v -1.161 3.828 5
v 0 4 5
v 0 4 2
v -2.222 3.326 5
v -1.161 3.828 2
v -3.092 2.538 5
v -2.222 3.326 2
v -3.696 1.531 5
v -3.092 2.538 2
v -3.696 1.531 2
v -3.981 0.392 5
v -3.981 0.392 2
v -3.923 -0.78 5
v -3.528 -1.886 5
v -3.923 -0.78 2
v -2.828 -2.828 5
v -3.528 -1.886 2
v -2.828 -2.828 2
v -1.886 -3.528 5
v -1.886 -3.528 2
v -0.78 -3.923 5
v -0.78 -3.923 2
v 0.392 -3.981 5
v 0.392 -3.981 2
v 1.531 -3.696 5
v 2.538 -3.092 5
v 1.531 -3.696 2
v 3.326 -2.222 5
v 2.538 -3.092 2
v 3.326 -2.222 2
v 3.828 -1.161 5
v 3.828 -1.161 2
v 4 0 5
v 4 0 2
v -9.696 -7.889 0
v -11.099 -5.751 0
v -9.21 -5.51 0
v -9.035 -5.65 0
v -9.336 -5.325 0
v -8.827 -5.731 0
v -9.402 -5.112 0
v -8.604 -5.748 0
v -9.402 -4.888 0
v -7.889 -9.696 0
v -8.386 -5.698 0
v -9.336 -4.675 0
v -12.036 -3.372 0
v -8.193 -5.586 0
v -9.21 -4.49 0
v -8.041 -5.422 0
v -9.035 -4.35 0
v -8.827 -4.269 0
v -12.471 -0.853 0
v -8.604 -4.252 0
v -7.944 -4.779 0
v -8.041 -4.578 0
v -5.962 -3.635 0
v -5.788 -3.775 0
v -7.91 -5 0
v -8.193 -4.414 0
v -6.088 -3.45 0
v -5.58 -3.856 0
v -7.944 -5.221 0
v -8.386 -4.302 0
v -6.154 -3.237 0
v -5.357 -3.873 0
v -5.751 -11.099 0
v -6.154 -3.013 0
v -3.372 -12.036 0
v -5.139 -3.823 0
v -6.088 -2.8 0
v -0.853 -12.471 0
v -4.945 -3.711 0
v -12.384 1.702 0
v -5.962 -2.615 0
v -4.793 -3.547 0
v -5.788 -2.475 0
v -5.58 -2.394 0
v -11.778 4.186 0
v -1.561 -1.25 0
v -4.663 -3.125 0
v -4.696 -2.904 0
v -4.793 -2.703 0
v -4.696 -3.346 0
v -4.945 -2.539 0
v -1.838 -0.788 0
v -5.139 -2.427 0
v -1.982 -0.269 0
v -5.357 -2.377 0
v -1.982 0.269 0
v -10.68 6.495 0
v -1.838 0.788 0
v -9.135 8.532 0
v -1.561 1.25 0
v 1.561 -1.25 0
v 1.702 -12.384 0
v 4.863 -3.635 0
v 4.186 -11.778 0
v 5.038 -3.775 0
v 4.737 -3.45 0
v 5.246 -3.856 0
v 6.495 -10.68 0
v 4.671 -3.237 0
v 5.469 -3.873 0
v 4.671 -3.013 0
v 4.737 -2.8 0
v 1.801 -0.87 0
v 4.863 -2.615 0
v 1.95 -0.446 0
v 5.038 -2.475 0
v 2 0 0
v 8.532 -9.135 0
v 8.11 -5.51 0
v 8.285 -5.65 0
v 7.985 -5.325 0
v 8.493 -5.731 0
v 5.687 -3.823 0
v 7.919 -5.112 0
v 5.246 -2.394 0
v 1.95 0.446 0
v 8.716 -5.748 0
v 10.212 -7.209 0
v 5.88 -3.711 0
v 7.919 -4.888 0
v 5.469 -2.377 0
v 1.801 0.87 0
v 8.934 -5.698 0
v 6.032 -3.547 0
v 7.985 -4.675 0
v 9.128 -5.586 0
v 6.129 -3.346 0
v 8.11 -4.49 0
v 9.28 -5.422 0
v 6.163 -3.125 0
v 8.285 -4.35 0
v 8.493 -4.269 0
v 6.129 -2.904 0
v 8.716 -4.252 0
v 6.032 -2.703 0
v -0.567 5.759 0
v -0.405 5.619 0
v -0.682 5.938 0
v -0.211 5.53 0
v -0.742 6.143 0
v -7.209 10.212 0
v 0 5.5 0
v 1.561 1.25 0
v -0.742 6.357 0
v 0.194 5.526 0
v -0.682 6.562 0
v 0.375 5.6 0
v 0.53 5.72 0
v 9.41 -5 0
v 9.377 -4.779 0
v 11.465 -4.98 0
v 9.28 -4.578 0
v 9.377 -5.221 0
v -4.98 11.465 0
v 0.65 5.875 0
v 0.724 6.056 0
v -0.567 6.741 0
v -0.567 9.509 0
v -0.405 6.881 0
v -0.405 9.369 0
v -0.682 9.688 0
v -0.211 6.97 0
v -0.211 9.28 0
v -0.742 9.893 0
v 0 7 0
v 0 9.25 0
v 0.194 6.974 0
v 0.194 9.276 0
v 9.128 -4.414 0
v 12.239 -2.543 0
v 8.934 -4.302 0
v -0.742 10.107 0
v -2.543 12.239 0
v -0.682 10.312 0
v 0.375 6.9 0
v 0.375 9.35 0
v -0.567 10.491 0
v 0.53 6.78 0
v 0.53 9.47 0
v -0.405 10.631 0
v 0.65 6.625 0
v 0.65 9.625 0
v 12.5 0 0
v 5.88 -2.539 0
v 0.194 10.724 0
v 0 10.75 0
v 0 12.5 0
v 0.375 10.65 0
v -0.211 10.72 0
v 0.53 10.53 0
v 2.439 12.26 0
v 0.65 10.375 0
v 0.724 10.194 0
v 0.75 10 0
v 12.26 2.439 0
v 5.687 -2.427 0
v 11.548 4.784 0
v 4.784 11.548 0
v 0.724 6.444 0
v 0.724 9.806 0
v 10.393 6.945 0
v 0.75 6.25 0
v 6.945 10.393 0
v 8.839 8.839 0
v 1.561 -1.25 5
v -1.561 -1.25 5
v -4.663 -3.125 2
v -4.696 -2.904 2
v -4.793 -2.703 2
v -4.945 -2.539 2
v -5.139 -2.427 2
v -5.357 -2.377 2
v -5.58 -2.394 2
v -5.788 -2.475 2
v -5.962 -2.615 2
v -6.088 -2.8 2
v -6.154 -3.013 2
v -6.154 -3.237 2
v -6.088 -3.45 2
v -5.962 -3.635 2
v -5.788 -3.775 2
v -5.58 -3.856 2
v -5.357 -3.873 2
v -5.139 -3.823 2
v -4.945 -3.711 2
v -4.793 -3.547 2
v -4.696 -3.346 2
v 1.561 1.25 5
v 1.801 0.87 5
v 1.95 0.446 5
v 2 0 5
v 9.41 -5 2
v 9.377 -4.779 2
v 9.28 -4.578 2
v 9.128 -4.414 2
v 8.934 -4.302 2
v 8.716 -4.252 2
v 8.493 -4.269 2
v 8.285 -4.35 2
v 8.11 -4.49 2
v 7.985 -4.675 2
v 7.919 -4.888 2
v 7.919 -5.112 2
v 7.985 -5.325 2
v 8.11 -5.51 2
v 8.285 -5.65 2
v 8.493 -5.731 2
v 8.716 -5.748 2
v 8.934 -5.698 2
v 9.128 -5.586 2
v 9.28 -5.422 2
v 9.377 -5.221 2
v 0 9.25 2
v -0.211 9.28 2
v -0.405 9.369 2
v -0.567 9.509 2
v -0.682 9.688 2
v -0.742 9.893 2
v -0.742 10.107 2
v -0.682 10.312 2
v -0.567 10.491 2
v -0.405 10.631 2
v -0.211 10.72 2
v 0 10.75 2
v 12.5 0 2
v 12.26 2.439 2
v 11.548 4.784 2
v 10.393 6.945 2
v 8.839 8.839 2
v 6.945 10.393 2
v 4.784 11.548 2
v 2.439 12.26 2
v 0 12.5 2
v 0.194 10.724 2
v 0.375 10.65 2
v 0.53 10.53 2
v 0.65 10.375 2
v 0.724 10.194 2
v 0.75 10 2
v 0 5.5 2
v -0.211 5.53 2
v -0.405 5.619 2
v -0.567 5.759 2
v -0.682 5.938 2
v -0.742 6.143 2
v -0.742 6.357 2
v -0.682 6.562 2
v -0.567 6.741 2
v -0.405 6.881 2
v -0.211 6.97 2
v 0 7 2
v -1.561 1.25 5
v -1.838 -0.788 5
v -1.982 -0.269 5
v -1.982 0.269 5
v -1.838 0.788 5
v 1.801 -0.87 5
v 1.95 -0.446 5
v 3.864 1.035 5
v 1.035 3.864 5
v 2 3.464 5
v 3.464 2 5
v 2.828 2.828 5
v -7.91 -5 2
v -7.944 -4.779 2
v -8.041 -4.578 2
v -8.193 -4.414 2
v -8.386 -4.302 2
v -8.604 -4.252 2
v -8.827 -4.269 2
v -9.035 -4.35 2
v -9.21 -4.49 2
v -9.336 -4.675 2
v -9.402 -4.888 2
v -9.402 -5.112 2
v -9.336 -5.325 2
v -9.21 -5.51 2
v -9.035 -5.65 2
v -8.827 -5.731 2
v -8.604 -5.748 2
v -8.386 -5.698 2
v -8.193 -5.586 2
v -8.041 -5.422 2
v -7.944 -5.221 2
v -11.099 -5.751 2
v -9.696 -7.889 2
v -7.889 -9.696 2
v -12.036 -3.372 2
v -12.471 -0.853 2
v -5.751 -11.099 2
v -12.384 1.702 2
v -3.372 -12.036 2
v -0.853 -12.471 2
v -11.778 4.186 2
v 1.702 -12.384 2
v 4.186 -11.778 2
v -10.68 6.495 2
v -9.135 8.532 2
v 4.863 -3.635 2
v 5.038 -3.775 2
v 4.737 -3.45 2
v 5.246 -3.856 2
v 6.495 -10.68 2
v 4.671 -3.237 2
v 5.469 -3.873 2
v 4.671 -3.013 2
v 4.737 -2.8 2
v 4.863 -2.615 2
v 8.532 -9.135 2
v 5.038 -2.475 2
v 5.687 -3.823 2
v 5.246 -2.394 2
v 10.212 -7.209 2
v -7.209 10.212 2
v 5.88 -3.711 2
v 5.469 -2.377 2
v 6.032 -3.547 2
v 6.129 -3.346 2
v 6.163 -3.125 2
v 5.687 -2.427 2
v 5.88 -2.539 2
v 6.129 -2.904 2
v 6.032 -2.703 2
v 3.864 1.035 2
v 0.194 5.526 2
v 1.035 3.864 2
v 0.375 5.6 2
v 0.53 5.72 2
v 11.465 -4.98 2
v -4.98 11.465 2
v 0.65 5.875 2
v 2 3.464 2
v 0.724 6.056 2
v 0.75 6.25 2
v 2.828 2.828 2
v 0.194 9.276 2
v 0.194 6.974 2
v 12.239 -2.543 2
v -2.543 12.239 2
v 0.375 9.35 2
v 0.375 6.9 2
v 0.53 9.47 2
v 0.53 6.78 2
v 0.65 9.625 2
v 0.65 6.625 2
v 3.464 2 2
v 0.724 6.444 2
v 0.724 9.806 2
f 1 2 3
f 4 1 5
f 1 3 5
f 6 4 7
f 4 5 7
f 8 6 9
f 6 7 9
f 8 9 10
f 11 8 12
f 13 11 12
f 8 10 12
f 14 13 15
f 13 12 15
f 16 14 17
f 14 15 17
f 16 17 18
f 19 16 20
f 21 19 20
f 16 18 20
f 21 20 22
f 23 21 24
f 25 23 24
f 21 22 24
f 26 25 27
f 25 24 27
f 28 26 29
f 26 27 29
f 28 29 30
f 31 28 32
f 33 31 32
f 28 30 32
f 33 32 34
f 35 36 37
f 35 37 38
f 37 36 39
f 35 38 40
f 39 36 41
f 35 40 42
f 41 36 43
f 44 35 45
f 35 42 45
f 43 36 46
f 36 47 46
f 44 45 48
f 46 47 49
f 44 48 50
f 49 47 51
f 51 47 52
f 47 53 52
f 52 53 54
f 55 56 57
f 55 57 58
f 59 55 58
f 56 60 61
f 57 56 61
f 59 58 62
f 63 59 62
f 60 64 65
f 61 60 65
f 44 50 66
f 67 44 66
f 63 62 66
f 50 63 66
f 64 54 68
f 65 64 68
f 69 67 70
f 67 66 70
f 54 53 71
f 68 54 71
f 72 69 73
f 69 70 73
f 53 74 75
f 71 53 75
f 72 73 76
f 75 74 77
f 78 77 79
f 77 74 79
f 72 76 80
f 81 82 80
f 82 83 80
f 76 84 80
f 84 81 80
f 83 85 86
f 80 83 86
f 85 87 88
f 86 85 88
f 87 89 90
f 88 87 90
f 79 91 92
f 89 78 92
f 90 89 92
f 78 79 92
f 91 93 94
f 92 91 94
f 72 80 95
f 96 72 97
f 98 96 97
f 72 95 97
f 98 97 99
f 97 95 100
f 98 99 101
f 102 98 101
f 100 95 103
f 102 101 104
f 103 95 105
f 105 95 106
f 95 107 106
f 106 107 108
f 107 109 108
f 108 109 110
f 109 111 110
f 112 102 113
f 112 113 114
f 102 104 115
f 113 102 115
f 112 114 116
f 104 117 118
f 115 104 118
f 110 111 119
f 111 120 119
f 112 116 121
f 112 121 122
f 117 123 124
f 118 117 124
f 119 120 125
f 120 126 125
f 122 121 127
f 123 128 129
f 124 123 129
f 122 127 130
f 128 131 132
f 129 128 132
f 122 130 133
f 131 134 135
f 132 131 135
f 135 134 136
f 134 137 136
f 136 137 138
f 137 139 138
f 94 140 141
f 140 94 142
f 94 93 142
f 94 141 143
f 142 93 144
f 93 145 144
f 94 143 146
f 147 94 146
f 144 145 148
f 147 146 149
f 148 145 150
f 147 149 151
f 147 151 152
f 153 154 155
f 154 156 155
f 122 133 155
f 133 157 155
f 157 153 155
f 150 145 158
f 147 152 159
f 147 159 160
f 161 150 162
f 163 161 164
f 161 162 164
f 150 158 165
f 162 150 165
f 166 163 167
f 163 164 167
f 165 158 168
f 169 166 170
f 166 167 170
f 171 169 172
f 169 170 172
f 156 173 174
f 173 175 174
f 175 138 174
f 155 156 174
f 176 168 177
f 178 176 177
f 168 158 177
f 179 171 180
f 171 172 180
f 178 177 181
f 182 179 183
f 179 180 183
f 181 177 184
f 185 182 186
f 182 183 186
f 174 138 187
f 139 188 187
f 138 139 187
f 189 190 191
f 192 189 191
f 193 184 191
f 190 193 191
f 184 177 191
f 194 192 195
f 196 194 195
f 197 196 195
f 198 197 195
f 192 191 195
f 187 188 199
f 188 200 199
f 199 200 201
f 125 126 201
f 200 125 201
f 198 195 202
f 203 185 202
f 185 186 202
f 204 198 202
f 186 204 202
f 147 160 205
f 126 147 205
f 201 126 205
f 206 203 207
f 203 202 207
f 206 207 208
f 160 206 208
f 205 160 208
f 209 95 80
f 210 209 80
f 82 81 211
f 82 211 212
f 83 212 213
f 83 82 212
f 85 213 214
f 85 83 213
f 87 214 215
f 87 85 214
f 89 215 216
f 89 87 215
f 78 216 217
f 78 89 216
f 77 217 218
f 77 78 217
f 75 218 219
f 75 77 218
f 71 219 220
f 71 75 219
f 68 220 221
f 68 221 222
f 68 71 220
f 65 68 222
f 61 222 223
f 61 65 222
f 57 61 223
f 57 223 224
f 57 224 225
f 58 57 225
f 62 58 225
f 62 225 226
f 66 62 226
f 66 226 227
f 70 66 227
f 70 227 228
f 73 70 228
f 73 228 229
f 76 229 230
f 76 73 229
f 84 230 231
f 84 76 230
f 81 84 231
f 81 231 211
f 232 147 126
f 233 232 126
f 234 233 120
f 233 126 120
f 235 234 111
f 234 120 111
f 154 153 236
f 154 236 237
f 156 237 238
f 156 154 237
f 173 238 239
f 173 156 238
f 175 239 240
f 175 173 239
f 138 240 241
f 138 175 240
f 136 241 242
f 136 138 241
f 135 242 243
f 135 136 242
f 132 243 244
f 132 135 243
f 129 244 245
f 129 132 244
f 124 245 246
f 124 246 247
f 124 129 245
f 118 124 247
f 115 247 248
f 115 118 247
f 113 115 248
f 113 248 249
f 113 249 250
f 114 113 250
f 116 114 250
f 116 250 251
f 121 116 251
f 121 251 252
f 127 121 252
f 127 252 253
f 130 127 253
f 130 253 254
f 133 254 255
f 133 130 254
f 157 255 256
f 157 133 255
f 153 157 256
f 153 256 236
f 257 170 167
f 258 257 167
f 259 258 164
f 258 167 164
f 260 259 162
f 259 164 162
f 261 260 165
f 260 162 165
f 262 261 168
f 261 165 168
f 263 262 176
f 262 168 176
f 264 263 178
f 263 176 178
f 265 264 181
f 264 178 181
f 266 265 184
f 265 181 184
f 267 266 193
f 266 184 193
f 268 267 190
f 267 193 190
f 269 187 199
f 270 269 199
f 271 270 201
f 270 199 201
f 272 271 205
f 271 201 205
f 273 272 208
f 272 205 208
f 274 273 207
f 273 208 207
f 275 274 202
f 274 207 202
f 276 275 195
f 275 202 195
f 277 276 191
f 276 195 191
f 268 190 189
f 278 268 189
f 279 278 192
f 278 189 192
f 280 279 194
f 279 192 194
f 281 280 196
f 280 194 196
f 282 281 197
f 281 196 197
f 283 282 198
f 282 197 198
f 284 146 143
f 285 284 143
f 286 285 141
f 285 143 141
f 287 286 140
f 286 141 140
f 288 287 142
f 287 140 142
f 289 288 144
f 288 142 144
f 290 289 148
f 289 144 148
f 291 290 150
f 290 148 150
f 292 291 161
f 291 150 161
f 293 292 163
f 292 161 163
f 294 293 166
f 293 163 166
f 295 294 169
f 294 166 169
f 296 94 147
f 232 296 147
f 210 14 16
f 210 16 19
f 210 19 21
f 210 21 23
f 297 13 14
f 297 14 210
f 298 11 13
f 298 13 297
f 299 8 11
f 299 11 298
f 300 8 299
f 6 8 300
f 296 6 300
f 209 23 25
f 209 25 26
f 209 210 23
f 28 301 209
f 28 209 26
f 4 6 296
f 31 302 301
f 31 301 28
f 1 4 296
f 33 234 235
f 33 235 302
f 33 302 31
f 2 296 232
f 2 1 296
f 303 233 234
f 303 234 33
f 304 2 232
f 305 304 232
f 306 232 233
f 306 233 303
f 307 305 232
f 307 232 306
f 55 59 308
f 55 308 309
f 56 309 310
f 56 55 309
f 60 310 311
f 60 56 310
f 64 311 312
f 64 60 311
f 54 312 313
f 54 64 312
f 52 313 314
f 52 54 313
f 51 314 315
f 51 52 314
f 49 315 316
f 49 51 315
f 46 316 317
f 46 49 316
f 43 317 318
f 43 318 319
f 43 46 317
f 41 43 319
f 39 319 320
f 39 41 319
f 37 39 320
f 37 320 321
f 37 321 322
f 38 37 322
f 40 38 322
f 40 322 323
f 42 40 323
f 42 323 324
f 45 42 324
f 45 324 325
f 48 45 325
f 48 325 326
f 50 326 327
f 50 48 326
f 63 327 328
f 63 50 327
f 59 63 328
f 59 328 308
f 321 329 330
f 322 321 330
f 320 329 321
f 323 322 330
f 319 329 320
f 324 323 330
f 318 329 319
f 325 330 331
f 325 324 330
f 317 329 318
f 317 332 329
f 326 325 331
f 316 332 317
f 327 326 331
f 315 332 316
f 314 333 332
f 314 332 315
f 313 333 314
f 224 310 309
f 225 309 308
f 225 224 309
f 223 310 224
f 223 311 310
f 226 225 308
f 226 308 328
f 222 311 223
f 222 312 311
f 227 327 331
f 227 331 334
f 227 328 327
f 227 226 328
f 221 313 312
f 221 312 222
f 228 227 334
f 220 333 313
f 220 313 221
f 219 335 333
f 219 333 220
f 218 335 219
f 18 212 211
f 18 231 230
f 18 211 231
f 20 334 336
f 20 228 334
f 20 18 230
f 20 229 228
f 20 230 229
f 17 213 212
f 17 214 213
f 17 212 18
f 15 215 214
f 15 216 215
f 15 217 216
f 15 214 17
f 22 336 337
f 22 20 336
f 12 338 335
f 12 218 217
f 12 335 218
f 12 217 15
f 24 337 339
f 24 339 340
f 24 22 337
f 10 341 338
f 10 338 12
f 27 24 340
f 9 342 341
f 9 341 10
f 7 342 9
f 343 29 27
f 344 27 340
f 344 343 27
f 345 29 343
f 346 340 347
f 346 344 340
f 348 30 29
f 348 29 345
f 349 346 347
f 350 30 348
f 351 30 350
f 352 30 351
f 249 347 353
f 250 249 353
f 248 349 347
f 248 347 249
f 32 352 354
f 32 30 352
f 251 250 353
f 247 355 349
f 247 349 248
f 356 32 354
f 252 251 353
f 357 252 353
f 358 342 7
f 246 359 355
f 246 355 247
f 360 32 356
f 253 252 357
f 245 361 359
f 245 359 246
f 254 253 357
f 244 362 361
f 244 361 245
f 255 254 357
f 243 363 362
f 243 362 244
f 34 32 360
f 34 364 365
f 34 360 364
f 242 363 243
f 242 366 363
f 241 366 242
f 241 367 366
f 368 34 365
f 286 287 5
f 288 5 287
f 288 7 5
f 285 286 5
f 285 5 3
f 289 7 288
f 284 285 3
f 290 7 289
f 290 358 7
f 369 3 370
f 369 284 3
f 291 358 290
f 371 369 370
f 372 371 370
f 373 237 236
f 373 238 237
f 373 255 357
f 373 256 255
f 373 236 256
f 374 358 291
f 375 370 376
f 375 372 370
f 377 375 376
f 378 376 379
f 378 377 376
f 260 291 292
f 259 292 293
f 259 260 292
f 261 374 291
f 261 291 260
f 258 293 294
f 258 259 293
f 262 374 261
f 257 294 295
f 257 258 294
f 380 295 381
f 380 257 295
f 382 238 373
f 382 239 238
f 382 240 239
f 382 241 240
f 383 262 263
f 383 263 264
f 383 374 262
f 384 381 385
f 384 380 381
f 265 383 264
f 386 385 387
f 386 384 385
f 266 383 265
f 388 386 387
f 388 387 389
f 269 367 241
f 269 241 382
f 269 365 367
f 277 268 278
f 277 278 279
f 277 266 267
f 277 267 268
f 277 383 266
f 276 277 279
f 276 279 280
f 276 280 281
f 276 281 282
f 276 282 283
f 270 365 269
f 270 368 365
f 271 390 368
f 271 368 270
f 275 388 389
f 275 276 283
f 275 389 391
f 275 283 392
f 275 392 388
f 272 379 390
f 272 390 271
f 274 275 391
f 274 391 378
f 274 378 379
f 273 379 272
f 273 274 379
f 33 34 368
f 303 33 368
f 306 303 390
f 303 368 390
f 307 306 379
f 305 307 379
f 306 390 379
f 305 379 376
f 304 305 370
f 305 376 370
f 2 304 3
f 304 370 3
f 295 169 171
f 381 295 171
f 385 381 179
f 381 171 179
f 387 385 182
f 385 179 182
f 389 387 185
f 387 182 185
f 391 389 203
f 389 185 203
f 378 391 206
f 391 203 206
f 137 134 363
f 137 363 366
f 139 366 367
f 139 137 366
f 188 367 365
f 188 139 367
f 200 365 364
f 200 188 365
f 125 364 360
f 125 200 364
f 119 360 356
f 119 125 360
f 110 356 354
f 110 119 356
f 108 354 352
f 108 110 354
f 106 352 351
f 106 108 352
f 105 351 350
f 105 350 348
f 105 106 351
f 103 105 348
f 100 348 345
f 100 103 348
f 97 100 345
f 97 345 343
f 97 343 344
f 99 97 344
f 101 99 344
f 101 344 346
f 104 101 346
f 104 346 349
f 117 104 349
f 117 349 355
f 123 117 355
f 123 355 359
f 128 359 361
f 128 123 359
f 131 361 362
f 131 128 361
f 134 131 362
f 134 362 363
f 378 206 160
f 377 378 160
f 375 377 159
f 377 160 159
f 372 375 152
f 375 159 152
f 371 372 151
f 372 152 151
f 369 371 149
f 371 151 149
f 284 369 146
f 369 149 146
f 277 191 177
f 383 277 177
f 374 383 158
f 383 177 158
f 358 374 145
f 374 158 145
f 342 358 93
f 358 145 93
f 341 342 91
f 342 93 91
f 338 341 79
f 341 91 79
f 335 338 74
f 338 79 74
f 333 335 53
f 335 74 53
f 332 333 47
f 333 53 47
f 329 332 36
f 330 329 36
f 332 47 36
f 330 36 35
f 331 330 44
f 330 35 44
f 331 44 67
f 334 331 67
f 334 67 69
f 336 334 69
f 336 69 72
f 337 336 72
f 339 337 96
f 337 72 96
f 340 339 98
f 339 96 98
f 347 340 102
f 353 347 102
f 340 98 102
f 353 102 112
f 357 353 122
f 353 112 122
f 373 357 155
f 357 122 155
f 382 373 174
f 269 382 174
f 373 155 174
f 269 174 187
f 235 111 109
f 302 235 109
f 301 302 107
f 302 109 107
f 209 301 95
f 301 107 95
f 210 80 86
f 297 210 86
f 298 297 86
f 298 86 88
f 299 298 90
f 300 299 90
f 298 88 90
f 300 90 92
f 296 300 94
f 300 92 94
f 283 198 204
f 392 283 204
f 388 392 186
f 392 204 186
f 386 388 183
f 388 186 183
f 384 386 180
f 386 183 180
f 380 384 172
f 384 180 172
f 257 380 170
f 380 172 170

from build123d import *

# Parameters (mm, degrees)
F0_R     = 0.75
F1_DEPTH = 2
F2_DEPTH = 5


with BuildPart() as f1:
    # F0 (on Top) → F1 (new body)
    with BuildSketch(Plane.XY):
        with BuildLine():
            ThreePointArc((12.5, 0), (8.8388347648, 8.8388347648), (0, 12.5))
            ThreePointArc((0, 12.5), (-8.8388347648, -8.8388347648), (12.5, 0))
        make_face()
        with Locations((-8.6602540378, -5)):
            Circle(F0_R, mode=Mode.SUBTRACT)
        with Locations((-5.4126587737, -3.125)):
            Circle(F0_R, mode=Mode.SUBTRACT)
        with Locations((5.4126587737, -3.125)):
            Circle(F0_R, mode=Mode.SUBTRACT)
        with Locations((8.6602540378, -5)):
            Circle(F0_R, mode=Mode.SUBTRACT)
        with BuildLine():
            ThreePointArc((4, 0), (-2.8284271247, -2.8284271247), (0, 4))
            ThreePointArc((0, 4), (2.8284271247, 2.8284271247), (4, 0))
        make_face(mode=Mode.SUBTRACT)
        with BuildLine():
            ThreePointArc((0.75, 6.25), (0.5303300859, 5.7196699141), (0, 5.5))
            ThreePointArc((0, 5.5), (-0.75, 6.25), (0, 7))
            ThreePointArc((0, 7), (0.5303300859, 6.7803300859), (0.75, 6.25))
        make_face(mode=Mode.SUBTRACT)
        with BuildLine():
            ThreePointArc((0.75, 10), (0.5303300859, 9.4696699141), (0, 9.25))
            ThreePointArc((0, 9.25), (-0.75, 10), (0, 10.75))
            ThreePointArc((0, 10.75), (0.5303300859, 10.5303300859), (0.75, 10))
        make_face(mode=Mode.SUBTRACT)
    extrude(amount=F1_DEPTH)

    # F0 (on Top) → F2 (join)
    with BuildSketch(Plane.XY):
        with BuildLine():
            ThreePointArc((4, 0), (2.8284271247, 2.8284271247), (0, 4))
            ThreePointArc((0, 4), (-2.8284271247, -2.8284271247), (4, 0))
        make_face()
        with BuildLine():
            ThreePointArc((1.5612494996, 1.25), (1.8871273141, 0.6623824427), (2, 0))
            ThreePointArc((2, 0), (1.8871273141, -0.6623824427), (1.5612494996, -1.25))
            ThreePointArc((1.5612494996, -1.25), (0, -2), (-1.5612494996, -1.25))
            ThreePointArc((-1.5612494996, -1.25), (-2, 0), (-1.5612494996, 1.25))
            ThreePointArc((-1.5612494996, 1.25), (-0.8660254038, 1.8027756377), (0, 2))
            ThreePointArc((0, 2), (0.8660254038, 1.8027756377), (1.5612494996, 1.25))
        make_face(mode=Mode.SUBTRACT)
        with BuildLine():
            Line((0, 1.25), (1.5612494996, 1.25))
            ThreePointArc((1.5612494996, 1.25), (0.8660254038, 1.8027756377), (0, 2))
            Line((0, 2), (0, 1.25))
        make_face()
        with BuildLine():
            Line((0, 1.25), (0, 2))
            ThreePointArc((0, 2), (-0.8660254038, 1.8027756377), (-1.5612494996, 1.25))
            Line((-1.5612494996, 1.25), (0, 1.25))
        make_face()
        with BuildLine():
            ThreePointArc((-1.5612494996, -1.25), (0, -2), (1.5612494996, -1.25))
            Line((1.5612494996, -1.25), (-1.5612494996, -1.25))
        make_face()
    extrude(amount=F2_DEPTH)


solid = f1.part
